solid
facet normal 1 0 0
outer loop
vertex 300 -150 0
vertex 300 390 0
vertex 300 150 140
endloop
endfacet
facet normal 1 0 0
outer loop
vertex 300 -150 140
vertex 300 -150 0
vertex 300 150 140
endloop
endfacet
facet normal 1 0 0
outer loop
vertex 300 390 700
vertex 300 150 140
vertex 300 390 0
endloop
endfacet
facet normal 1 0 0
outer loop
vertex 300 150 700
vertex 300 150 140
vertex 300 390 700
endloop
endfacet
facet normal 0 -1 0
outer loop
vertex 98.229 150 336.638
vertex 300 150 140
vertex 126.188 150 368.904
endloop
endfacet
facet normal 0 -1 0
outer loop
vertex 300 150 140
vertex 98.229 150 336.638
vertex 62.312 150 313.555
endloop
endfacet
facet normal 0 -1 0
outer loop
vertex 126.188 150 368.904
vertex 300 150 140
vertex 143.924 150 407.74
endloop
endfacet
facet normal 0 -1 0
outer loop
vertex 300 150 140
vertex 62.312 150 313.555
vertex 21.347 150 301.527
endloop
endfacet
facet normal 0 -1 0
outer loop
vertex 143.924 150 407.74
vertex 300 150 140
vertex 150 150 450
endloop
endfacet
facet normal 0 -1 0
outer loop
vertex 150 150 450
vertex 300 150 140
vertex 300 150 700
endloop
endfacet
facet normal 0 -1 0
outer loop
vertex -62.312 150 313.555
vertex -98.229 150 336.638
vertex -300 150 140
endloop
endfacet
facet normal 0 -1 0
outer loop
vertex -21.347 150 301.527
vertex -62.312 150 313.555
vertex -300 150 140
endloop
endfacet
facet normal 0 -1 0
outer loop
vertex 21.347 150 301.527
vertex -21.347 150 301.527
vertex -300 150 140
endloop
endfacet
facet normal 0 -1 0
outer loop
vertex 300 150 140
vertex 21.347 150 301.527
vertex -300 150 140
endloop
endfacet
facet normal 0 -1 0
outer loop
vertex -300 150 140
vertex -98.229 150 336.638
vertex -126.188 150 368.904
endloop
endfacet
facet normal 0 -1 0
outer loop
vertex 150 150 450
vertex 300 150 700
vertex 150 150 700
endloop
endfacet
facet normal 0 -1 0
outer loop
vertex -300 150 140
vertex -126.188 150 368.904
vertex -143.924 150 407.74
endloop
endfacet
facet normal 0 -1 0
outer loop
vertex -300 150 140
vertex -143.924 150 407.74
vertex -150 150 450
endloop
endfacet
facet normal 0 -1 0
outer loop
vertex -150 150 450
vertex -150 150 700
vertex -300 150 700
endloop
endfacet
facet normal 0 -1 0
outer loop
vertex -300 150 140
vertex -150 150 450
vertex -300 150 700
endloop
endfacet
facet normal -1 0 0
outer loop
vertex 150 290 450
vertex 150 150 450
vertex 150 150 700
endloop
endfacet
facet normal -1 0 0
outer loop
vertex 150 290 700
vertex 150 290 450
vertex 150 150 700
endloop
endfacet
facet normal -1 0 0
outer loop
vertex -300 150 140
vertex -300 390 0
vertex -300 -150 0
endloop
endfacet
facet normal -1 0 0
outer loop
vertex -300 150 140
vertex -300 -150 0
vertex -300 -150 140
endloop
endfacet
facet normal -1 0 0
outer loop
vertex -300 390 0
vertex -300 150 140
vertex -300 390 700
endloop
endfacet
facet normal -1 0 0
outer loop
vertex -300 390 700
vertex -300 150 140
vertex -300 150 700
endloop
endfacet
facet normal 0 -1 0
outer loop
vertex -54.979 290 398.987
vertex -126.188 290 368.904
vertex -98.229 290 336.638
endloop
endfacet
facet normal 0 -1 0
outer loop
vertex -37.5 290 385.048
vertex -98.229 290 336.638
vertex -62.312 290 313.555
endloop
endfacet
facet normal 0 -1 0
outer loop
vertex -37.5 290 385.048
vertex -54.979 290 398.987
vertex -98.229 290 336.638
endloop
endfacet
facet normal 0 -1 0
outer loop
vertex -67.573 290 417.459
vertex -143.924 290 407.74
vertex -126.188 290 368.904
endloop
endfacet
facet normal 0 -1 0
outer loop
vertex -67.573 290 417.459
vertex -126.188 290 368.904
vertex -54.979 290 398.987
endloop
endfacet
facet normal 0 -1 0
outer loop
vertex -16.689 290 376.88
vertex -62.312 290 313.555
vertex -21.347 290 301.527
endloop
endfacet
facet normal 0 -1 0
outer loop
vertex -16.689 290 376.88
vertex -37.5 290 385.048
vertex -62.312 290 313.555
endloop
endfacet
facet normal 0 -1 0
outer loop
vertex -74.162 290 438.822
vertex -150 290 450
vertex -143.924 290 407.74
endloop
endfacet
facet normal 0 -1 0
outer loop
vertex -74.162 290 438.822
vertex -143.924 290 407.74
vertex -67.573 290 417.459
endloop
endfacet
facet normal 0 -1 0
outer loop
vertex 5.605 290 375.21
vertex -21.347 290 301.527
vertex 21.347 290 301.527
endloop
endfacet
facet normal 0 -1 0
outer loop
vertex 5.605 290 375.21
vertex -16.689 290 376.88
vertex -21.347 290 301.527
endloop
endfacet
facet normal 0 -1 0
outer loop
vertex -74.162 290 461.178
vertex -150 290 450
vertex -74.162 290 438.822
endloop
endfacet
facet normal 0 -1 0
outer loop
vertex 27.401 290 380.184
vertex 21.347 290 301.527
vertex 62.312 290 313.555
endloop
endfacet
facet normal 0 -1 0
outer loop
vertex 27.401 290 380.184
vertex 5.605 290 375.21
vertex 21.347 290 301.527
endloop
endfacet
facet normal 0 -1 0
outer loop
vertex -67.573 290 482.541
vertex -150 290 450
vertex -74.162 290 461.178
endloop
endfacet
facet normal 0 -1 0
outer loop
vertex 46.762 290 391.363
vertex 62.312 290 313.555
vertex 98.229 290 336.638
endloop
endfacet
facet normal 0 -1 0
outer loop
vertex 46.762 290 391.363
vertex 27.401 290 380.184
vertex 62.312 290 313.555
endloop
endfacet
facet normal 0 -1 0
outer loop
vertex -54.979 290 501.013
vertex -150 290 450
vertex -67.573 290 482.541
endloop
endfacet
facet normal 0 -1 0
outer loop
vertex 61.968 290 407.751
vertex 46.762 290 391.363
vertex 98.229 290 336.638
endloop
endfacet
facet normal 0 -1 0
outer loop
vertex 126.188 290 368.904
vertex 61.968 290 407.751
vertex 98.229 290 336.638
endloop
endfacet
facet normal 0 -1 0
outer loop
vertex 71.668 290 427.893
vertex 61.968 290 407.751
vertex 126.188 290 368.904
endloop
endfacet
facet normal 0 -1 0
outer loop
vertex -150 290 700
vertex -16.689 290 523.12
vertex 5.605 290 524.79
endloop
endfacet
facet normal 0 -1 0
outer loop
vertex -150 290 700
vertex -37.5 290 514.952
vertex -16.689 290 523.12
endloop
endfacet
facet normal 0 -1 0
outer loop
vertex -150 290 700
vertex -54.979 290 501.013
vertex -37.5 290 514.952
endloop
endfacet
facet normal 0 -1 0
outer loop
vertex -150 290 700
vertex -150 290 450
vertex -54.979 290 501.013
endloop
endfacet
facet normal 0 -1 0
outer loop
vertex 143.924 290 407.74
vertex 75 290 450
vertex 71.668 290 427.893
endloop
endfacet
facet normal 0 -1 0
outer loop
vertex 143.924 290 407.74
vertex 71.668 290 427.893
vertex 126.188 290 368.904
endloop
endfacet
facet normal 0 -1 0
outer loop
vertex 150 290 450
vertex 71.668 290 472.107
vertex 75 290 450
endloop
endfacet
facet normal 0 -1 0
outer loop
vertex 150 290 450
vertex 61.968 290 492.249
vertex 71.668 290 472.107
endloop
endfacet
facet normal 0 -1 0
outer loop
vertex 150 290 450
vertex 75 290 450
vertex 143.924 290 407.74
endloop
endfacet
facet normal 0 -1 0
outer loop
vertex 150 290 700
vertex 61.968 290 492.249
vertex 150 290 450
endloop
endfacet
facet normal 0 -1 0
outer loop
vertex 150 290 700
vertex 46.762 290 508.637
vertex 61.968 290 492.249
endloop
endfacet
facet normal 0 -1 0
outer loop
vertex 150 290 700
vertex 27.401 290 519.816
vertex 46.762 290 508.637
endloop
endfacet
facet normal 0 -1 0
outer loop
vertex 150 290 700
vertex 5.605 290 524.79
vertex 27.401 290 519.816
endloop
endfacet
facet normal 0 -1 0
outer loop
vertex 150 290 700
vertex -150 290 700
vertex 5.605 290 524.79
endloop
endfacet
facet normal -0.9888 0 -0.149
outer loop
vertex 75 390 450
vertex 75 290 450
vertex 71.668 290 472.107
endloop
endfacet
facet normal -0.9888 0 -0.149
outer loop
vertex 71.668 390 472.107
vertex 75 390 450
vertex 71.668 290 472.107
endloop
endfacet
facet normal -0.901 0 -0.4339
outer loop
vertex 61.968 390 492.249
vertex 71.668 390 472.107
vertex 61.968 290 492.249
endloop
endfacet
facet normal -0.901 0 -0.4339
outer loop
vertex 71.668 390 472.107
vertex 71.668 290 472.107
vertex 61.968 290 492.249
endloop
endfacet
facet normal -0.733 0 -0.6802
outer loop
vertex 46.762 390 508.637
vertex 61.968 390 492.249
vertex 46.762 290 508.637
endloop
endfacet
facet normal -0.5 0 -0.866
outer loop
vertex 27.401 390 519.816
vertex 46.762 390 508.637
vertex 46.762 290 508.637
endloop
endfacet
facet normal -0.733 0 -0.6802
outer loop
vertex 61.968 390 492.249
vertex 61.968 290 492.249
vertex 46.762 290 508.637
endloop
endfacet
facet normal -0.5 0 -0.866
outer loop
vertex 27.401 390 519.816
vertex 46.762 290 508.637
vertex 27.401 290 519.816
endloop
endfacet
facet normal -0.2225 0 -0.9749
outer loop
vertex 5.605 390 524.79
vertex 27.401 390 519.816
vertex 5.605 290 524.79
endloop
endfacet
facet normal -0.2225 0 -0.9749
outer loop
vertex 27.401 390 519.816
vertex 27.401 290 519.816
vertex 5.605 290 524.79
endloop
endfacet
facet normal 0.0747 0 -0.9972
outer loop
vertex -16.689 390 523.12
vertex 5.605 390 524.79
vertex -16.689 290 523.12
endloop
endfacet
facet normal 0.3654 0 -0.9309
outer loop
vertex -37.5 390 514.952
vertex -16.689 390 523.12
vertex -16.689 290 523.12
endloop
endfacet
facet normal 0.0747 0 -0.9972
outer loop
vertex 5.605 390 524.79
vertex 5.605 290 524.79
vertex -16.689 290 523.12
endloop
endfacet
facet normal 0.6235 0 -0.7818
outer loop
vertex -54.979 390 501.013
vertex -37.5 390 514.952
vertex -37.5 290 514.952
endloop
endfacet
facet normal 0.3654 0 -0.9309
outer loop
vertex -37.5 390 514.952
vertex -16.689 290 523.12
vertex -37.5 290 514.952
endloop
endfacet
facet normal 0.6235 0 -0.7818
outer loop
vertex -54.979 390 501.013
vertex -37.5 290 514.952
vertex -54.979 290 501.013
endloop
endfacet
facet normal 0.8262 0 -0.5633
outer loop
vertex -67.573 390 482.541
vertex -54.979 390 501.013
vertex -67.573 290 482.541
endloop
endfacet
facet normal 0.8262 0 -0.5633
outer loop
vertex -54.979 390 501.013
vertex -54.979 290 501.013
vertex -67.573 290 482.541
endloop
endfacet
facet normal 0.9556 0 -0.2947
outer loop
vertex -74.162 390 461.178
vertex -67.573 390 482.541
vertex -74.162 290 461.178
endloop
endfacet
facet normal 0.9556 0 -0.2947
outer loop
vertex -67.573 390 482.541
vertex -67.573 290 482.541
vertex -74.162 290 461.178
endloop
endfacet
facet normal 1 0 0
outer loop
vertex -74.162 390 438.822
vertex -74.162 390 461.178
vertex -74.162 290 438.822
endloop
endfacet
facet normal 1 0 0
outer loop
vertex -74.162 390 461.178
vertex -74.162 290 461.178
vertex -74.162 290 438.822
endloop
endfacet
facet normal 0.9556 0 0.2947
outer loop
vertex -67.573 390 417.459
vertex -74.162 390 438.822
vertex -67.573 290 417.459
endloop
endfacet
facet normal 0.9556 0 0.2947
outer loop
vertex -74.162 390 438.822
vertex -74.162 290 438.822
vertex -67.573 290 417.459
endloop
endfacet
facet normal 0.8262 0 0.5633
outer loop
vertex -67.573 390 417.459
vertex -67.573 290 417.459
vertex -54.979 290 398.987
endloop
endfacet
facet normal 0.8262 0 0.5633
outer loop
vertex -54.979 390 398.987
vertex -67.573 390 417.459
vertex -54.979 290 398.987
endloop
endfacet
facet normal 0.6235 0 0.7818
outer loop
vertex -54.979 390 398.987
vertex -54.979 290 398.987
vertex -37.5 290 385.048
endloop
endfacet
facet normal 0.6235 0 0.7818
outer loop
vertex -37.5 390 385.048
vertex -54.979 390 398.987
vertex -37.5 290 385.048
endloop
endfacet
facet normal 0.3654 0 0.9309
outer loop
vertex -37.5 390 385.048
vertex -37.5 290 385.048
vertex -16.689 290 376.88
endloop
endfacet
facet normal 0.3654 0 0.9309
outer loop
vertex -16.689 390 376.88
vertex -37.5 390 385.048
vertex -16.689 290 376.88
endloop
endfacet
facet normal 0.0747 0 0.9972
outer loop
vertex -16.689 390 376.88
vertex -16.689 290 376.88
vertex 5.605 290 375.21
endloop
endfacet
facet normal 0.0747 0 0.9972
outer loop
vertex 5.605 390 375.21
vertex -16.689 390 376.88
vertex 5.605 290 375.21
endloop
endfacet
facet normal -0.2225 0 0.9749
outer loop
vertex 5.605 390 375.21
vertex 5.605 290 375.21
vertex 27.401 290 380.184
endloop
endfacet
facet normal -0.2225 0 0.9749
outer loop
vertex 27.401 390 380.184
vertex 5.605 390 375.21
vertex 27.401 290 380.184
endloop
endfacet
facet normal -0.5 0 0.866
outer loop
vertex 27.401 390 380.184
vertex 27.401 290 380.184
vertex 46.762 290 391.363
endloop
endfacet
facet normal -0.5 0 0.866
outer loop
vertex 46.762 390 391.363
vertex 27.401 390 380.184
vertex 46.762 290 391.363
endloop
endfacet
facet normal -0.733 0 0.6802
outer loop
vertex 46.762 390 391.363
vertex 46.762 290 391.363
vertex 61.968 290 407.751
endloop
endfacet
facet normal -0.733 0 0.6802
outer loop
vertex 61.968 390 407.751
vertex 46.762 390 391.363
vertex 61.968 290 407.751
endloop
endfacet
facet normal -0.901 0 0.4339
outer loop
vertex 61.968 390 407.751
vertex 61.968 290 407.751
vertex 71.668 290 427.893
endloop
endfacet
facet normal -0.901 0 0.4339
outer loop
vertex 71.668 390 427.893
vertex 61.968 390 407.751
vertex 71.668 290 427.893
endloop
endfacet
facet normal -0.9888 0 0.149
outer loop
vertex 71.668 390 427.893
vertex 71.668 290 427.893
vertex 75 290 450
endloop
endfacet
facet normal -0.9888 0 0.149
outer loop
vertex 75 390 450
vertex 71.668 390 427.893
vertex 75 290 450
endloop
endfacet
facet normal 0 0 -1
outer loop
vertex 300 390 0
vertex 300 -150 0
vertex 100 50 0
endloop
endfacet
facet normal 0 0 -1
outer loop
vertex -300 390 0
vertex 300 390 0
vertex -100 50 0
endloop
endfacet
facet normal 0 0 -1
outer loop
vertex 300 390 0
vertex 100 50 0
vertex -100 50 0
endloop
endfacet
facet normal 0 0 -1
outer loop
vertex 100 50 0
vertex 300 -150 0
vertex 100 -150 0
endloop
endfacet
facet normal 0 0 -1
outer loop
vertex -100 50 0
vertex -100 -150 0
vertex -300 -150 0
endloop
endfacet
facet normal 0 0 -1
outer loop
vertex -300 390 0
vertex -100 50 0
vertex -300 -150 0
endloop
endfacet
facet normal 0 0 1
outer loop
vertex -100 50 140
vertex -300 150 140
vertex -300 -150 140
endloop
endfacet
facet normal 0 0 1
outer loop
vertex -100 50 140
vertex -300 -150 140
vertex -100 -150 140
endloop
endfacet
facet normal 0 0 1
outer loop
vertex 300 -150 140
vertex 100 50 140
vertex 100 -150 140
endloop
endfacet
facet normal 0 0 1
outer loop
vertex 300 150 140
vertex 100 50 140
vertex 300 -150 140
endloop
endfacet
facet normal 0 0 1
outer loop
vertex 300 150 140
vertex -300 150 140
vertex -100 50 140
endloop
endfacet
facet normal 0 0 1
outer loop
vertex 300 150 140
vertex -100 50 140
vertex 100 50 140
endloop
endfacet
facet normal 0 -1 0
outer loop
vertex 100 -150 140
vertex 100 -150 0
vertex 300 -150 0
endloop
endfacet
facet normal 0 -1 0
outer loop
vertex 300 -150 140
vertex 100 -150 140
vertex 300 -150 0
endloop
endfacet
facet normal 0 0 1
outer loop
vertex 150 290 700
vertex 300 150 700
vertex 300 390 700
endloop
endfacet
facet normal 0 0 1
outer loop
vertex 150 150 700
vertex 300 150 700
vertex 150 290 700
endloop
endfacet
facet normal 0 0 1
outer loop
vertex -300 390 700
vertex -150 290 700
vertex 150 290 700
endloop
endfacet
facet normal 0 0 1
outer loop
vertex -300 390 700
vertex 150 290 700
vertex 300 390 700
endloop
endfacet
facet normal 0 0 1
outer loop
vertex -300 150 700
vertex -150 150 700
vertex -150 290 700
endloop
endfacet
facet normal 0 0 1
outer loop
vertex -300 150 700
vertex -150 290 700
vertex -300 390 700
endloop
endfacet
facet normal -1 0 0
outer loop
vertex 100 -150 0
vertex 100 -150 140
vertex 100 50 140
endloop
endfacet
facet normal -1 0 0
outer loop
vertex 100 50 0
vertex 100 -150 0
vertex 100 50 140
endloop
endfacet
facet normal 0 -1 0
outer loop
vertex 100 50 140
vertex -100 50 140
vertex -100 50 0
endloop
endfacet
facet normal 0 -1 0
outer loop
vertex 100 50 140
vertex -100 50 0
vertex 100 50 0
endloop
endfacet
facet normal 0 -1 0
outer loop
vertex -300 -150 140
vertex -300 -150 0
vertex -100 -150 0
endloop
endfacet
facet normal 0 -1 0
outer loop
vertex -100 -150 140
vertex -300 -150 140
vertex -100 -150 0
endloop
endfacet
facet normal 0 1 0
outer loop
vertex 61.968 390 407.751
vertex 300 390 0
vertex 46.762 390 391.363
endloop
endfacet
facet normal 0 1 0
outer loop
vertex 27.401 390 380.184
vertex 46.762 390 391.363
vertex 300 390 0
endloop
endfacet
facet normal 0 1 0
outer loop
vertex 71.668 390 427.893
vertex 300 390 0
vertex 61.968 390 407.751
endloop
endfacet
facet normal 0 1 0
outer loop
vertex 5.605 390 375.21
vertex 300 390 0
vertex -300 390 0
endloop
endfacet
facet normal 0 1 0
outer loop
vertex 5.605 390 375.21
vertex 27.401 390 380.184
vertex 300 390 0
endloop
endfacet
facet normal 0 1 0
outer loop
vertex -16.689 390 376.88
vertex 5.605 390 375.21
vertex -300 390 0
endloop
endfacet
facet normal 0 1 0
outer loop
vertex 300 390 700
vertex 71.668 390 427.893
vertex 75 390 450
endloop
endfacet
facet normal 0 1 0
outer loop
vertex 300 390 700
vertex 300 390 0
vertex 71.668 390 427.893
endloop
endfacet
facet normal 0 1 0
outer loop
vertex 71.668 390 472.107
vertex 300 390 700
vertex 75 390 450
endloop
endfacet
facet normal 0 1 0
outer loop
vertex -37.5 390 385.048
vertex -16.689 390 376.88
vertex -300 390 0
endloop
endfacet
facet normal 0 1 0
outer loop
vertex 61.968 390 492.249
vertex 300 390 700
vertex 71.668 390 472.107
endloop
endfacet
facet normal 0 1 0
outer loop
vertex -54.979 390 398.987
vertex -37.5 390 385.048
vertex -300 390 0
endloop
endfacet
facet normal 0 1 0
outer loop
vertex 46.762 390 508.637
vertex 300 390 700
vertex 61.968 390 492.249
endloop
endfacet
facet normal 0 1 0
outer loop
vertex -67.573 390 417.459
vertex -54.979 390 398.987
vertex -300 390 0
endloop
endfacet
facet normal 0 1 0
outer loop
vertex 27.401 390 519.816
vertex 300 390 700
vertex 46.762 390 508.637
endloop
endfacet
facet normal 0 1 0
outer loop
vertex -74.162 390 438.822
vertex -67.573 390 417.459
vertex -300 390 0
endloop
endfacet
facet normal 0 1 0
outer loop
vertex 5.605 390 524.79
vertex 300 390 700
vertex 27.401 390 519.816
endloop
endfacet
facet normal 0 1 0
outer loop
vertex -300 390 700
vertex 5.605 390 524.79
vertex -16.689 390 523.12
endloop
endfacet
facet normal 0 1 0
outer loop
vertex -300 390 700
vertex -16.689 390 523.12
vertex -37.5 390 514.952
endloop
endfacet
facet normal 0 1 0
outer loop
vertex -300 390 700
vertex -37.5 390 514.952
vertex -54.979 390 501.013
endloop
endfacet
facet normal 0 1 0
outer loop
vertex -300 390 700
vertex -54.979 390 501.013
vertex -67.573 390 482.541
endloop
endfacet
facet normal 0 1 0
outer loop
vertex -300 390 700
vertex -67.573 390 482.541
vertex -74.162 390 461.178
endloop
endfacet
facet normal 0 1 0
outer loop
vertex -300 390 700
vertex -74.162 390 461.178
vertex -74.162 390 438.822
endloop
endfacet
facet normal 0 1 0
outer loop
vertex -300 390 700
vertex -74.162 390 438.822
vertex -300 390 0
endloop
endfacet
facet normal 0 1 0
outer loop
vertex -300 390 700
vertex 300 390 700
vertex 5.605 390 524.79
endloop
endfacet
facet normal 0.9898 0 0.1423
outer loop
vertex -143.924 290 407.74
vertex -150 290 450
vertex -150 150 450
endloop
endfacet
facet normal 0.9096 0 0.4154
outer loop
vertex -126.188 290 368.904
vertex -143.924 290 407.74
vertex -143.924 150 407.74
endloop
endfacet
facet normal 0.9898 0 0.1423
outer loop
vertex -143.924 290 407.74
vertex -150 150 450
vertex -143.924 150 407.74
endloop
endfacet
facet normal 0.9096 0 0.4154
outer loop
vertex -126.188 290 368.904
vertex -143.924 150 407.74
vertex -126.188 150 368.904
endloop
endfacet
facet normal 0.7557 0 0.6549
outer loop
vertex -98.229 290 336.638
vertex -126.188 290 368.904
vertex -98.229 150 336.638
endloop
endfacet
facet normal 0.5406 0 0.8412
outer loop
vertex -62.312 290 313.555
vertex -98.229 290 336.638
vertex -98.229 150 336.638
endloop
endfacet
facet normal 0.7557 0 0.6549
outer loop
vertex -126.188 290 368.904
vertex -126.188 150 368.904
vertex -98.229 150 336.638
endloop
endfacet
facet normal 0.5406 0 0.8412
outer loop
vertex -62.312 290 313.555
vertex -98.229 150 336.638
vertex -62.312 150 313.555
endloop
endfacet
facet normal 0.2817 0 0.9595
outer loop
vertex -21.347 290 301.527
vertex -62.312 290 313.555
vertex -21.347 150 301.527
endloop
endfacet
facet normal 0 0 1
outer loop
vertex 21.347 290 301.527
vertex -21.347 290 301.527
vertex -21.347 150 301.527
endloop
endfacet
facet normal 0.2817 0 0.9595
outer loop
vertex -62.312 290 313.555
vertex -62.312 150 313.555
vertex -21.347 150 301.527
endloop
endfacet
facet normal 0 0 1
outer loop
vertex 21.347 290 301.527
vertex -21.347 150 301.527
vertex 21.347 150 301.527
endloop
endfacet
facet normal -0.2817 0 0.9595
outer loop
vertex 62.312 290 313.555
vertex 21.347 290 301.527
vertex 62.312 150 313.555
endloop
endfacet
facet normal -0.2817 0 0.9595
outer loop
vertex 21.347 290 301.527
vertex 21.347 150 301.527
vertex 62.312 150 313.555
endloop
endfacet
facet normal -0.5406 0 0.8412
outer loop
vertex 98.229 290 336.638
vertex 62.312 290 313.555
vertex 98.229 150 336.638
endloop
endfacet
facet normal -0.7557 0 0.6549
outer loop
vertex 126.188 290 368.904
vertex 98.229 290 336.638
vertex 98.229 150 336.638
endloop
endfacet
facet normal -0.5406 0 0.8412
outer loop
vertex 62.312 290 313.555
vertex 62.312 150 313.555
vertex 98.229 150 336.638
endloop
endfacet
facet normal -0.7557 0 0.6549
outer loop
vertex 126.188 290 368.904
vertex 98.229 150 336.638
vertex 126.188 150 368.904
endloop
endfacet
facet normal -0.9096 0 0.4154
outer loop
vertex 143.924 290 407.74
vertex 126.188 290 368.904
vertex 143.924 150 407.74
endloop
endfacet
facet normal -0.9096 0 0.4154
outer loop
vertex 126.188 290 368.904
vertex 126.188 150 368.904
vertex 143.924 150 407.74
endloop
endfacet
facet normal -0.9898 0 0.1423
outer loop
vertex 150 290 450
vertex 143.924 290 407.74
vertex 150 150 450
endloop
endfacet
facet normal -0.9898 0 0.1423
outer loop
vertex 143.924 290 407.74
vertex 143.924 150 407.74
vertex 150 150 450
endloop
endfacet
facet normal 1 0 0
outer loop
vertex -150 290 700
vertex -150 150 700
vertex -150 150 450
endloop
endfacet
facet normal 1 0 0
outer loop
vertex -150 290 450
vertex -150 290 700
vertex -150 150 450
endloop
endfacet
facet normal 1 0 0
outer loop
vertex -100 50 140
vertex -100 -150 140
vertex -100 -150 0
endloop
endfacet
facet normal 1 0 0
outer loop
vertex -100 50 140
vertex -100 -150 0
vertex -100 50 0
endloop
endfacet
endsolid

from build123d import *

# Parameters (mm, degrees)
F0_W     = 600
F0_H     = 300
F1_DEPTH = 140
F2_W     = 200
F2_H     = 200
F3_DEPTH = 140.001
F4_W     = 600
F4_H     = 700
F5_DEPTH = 240
F7_DEPTH = 140
F8_R     = 75
F9_DEPTH = 100.001


with BuildPart() as f1:
    # F0 (on Top) → F1 (new body)
    with BuildSketch(Plane.XY):
        Rectangle(F0_W, F0_H)
    extrude(amount=F1_DEPTH)

    # F2 (on face) → F3 (cut, through all)
    with BuildSketch(Plane.XY.offset(140)):
        with Locations((0, -50)):
            Rectangle(F2_W, F2_H)
    extrude(amount=-F3_DEPTH, mode=Mode.SUBTRACT)

    # F4 (on face) → F5 (join)
    with BuildSketch(Plane(origin=(0, 150, 0), x_dir=(-1, 0, 0), z_dir=(0, 1, 0))):
        with Locations((0, 350)):
            Rectangle(F4_W, F4_H)
    extrude(amount=F5_DEPTH)

    # F6 (on face) → F7 (cut)
    with BuildSketch(Plane.XZ.offset(-150)):
        with BuildLine():
            Line((150, 450), (150, 700))
            Line((150, 700), (-150, 700))
            Line((-150, 700), (-150, 450))
            ThreePointArc((-150, 450), (0, 300), (150, 450))
        make_face()
    extrude(amount=-F7_DEPTH, mode=Mode.SUBTRACT)

    # F8 (on face) → F9 (cut, through all)
    with BuildSketch(Plane.XZ.offset(-290)):
        with Locations((0, 450)):
            Circle(F8_R)
    extrude(amount=-F9_DEPTH, mode=Mode.SUBTRACT)


solid = f1.part
